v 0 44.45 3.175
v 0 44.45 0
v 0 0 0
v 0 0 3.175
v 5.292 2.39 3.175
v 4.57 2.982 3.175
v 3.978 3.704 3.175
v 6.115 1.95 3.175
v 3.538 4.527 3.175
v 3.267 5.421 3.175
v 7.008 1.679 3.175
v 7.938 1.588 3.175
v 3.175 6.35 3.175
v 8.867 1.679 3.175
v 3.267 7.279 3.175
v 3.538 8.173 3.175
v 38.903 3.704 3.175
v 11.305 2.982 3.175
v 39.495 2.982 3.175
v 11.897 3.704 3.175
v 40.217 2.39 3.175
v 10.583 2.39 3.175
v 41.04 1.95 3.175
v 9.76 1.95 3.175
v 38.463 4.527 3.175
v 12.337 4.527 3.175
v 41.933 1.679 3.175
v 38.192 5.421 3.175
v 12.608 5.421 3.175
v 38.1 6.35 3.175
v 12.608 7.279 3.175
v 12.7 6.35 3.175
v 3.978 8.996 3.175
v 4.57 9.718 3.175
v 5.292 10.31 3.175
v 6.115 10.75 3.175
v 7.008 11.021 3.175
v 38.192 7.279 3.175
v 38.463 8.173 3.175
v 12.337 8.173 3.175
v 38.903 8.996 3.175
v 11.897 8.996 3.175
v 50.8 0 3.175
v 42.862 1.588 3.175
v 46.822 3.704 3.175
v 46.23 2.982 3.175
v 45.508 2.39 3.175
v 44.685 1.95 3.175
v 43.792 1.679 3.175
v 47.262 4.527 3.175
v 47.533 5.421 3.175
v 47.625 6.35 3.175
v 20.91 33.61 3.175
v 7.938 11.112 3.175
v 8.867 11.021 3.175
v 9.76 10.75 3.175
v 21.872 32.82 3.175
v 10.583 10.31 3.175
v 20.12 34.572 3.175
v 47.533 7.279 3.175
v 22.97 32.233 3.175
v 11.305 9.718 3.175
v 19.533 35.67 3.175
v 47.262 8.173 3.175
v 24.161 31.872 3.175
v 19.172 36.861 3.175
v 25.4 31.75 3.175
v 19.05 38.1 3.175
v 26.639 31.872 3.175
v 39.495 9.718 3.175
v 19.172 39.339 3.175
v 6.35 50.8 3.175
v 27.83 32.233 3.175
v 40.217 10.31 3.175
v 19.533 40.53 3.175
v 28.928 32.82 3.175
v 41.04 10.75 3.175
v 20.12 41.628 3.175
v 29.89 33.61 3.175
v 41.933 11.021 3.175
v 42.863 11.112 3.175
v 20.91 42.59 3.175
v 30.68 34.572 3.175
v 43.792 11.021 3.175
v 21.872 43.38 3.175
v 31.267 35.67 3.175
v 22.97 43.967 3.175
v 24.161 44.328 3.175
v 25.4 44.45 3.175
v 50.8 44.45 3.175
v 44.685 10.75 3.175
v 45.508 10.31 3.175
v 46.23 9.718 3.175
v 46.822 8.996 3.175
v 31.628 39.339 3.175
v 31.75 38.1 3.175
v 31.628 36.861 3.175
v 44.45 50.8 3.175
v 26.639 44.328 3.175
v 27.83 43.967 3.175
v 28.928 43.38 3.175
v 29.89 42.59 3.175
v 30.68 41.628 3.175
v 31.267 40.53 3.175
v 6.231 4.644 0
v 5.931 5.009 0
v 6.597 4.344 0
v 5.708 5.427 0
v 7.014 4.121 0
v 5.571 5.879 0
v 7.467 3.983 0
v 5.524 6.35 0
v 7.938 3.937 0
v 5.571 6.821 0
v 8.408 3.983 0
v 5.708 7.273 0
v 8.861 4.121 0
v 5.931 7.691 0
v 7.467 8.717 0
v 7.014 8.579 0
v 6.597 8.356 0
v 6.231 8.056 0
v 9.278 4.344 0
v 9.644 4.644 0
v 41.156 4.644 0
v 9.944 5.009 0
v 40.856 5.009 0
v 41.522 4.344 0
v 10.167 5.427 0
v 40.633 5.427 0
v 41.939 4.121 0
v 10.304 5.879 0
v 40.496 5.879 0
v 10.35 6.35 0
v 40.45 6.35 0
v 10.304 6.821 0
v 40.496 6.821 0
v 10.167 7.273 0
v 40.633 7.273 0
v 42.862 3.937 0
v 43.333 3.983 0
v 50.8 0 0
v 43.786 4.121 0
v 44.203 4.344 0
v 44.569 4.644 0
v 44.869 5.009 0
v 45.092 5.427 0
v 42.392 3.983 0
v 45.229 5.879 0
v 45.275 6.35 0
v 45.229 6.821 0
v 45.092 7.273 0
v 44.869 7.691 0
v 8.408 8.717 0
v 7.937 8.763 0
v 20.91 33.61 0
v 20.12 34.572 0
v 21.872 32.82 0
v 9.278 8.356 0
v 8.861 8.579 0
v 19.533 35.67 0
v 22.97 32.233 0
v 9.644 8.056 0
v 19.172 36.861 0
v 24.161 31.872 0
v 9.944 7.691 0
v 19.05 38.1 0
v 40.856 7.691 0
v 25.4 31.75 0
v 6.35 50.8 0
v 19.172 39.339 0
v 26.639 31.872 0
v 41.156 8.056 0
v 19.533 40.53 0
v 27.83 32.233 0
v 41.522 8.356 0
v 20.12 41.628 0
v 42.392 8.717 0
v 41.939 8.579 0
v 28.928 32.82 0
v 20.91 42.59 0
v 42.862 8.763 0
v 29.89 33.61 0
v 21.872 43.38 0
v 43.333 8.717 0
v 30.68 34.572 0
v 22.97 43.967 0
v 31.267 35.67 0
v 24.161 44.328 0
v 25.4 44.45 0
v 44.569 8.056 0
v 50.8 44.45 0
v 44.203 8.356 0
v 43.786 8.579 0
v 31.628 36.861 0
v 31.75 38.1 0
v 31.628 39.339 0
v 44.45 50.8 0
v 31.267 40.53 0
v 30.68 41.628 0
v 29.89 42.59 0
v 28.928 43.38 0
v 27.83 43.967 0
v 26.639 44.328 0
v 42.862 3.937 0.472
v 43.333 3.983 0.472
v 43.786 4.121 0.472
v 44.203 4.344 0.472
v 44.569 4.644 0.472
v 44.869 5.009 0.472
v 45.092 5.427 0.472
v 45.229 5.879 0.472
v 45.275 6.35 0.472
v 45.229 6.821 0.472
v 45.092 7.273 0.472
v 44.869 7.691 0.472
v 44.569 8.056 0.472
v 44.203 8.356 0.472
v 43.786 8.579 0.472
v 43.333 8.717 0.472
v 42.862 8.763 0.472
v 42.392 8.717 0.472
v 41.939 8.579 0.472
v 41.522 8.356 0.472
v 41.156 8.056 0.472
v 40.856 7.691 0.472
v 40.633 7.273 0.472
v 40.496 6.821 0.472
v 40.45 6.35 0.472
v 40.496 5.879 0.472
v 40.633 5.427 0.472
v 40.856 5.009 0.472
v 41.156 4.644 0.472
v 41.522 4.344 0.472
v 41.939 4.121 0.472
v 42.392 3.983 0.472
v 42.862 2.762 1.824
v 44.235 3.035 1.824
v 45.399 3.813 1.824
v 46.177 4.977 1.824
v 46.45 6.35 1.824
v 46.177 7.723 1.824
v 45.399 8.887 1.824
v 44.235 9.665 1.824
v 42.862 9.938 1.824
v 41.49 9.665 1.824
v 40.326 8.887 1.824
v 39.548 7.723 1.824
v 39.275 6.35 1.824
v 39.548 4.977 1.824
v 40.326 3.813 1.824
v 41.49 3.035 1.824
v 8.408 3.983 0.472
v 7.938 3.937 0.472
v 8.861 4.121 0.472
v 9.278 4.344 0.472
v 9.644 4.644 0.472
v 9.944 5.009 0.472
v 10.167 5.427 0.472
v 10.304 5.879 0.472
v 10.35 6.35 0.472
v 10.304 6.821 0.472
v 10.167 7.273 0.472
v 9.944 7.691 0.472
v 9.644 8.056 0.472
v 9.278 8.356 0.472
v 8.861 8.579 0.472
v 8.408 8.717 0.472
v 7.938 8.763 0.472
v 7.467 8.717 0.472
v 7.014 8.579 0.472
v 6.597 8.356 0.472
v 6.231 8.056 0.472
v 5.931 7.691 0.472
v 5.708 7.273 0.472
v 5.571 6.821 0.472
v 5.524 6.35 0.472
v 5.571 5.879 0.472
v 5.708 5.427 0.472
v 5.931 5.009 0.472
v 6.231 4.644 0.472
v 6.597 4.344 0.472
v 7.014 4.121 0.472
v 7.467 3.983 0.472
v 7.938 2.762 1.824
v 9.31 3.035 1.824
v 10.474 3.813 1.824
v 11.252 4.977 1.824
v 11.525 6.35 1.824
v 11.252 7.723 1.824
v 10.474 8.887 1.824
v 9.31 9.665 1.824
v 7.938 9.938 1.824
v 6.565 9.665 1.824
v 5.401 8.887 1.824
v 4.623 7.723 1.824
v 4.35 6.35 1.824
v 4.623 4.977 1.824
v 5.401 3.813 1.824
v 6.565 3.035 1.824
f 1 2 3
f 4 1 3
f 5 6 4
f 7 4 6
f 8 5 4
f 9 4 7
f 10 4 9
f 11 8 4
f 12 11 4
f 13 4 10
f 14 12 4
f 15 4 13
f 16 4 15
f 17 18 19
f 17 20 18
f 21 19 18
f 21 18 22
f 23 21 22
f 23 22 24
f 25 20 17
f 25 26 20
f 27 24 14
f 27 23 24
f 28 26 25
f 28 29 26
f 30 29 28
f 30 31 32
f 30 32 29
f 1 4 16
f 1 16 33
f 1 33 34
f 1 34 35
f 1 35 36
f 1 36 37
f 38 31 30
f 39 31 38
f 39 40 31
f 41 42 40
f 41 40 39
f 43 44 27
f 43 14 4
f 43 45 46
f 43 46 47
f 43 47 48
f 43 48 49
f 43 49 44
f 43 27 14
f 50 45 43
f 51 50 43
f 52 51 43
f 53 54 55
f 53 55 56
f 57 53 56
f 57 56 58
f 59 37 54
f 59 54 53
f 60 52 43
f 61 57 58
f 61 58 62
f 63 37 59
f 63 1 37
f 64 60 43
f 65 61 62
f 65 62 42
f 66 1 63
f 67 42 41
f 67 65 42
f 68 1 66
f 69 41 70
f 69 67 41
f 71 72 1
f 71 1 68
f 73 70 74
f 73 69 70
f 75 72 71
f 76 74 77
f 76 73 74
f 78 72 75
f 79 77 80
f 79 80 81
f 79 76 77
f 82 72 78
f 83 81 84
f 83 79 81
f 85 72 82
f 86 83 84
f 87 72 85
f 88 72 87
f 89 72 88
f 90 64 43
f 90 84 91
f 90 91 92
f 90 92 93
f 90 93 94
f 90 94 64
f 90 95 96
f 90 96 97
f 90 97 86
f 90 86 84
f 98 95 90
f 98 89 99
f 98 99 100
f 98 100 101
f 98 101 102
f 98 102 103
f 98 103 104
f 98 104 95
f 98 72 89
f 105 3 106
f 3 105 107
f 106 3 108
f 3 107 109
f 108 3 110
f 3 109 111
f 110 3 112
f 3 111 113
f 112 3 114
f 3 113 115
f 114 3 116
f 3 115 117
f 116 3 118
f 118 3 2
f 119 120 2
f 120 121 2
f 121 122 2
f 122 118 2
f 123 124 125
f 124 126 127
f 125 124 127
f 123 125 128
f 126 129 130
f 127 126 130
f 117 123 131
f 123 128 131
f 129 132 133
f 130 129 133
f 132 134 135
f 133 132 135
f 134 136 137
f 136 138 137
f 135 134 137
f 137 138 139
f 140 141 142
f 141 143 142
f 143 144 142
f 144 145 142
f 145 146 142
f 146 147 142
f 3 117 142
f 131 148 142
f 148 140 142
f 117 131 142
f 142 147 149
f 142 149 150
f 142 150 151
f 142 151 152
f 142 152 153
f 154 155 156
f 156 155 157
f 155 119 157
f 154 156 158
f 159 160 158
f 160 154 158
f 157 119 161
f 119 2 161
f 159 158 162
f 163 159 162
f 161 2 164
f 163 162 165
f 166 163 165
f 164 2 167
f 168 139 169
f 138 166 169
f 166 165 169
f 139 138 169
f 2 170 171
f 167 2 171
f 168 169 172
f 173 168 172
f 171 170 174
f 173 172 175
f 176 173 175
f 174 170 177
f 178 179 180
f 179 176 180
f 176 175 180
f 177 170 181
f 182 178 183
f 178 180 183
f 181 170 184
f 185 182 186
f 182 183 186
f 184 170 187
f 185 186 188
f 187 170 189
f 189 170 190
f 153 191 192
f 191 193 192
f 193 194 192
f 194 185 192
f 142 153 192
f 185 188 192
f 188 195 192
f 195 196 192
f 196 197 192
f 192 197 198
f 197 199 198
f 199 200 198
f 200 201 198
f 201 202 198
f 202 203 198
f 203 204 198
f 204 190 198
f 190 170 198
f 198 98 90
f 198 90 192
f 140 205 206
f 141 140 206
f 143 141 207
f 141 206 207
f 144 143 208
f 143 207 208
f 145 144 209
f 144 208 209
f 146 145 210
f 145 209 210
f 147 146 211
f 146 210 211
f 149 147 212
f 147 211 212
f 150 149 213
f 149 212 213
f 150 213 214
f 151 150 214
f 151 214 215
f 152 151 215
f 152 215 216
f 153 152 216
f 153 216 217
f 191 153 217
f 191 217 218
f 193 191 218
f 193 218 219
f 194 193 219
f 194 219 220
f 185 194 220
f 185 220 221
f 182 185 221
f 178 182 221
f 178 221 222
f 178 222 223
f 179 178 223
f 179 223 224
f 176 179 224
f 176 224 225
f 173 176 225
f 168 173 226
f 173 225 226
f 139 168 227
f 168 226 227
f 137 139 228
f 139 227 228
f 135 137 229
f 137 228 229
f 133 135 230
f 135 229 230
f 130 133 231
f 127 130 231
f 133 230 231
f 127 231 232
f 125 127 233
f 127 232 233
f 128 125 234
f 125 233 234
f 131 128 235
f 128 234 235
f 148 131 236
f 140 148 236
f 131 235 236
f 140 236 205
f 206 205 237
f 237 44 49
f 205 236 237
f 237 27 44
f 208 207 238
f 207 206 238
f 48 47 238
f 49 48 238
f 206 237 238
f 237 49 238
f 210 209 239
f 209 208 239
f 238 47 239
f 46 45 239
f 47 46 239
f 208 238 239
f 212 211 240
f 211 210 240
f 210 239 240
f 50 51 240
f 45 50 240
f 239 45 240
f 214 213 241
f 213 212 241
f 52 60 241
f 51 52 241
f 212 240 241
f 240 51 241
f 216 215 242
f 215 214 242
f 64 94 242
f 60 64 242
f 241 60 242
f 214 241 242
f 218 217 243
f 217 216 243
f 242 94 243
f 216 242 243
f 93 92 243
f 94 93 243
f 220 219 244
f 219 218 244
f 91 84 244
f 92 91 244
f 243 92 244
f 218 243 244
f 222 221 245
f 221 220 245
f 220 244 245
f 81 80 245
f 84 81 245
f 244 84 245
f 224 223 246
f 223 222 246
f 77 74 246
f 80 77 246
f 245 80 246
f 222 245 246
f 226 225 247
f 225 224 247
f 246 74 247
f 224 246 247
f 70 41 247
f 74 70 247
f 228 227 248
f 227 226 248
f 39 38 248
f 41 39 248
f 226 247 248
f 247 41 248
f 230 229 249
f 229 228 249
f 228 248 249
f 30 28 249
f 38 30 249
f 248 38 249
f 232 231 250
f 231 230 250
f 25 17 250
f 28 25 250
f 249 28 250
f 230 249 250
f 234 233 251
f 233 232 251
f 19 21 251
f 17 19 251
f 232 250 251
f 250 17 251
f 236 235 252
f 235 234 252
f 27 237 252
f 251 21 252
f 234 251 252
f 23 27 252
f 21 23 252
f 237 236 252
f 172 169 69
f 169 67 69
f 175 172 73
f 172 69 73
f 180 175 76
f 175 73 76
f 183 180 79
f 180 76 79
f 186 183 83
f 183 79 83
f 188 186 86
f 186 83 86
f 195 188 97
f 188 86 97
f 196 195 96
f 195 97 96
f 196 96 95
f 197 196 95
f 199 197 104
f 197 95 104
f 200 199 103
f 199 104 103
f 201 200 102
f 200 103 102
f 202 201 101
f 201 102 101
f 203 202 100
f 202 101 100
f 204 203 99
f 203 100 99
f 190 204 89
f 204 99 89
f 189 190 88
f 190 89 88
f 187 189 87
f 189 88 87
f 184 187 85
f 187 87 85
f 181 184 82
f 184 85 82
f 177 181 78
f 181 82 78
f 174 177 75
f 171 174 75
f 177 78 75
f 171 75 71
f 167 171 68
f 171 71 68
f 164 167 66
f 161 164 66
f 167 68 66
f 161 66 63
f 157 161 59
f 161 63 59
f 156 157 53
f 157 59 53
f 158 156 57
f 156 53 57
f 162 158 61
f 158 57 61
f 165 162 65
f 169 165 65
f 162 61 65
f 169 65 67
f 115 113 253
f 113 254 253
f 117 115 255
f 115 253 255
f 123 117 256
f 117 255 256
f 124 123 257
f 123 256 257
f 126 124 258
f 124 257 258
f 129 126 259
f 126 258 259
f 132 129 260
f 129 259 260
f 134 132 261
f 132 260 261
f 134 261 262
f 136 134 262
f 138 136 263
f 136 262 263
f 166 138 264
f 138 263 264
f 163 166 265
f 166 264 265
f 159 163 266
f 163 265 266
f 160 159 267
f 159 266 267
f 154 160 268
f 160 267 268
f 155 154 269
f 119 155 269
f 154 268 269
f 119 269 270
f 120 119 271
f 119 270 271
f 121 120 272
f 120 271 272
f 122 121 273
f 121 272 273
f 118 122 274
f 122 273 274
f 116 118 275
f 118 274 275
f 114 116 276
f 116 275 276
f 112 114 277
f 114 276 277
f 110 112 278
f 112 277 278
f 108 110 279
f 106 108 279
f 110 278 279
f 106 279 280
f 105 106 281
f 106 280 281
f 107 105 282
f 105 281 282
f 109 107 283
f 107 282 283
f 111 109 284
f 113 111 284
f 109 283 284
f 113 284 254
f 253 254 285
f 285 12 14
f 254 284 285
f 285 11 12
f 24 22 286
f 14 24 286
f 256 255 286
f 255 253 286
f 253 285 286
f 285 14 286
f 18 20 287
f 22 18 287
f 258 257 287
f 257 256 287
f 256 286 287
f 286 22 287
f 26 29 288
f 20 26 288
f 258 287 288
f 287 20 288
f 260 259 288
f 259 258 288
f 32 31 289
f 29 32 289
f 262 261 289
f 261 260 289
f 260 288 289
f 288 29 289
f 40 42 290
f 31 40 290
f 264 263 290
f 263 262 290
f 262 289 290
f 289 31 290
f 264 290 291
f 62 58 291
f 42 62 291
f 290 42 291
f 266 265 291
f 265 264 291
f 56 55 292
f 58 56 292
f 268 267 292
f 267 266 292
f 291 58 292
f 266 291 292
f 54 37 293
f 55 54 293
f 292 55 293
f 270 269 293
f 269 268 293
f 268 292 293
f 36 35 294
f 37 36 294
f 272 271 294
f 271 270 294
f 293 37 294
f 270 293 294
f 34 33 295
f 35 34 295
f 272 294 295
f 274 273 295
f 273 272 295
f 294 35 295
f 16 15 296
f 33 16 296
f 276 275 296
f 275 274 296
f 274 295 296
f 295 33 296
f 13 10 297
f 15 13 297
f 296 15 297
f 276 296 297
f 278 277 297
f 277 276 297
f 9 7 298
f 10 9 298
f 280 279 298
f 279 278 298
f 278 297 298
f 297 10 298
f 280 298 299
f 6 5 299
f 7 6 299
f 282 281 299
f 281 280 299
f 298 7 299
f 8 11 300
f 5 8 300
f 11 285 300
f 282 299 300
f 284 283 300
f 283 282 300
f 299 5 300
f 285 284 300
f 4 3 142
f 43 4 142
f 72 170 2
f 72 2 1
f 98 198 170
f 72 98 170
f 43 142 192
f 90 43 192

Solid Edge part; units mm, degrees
sketch "Sketch1" plane through (0, 0, 0) normal (0, 0, 1) x (1, 0, 0)
  line L0 (0, 0) -> (50.8, 0)
  line L1 (50.8, 0) -> (50.8, 50.8)
  line L2 (50.8, 50.8) -> (0, 50.8)
  line L3 (0, 50.8) -> (0, 0)
  dimension "D1" = 50.8
  dimension "D2" = 50.8
extrude "Protrusion1" add sketch "Sketch1" along normal blind 3.175
hole "Hole_1" at (42.8625, 6.35, 3.175) direction (0, 0, -1) diameter 4.826 end up to next countersink diameter 9.525 countersink angle 82
hole "Hole1" at (7.9375, 6.35, 3.175) direction (0, 0, -1) diameter 4.826 end up to next countersink diameter 9.525 countersink angle 82
hole "Hole_2" at (25.4, 38.1, 3.175) direction (0, 0, -1) diameter 12.7 end up to next
chamfer "Chamfer_1" distance 6.35 angle 45 2 edges at (0, 50.8, 1.5875) (50.8, 50.8, 1.5875)
properties part number "CHAS-04" material "Aluminum, 1060"
